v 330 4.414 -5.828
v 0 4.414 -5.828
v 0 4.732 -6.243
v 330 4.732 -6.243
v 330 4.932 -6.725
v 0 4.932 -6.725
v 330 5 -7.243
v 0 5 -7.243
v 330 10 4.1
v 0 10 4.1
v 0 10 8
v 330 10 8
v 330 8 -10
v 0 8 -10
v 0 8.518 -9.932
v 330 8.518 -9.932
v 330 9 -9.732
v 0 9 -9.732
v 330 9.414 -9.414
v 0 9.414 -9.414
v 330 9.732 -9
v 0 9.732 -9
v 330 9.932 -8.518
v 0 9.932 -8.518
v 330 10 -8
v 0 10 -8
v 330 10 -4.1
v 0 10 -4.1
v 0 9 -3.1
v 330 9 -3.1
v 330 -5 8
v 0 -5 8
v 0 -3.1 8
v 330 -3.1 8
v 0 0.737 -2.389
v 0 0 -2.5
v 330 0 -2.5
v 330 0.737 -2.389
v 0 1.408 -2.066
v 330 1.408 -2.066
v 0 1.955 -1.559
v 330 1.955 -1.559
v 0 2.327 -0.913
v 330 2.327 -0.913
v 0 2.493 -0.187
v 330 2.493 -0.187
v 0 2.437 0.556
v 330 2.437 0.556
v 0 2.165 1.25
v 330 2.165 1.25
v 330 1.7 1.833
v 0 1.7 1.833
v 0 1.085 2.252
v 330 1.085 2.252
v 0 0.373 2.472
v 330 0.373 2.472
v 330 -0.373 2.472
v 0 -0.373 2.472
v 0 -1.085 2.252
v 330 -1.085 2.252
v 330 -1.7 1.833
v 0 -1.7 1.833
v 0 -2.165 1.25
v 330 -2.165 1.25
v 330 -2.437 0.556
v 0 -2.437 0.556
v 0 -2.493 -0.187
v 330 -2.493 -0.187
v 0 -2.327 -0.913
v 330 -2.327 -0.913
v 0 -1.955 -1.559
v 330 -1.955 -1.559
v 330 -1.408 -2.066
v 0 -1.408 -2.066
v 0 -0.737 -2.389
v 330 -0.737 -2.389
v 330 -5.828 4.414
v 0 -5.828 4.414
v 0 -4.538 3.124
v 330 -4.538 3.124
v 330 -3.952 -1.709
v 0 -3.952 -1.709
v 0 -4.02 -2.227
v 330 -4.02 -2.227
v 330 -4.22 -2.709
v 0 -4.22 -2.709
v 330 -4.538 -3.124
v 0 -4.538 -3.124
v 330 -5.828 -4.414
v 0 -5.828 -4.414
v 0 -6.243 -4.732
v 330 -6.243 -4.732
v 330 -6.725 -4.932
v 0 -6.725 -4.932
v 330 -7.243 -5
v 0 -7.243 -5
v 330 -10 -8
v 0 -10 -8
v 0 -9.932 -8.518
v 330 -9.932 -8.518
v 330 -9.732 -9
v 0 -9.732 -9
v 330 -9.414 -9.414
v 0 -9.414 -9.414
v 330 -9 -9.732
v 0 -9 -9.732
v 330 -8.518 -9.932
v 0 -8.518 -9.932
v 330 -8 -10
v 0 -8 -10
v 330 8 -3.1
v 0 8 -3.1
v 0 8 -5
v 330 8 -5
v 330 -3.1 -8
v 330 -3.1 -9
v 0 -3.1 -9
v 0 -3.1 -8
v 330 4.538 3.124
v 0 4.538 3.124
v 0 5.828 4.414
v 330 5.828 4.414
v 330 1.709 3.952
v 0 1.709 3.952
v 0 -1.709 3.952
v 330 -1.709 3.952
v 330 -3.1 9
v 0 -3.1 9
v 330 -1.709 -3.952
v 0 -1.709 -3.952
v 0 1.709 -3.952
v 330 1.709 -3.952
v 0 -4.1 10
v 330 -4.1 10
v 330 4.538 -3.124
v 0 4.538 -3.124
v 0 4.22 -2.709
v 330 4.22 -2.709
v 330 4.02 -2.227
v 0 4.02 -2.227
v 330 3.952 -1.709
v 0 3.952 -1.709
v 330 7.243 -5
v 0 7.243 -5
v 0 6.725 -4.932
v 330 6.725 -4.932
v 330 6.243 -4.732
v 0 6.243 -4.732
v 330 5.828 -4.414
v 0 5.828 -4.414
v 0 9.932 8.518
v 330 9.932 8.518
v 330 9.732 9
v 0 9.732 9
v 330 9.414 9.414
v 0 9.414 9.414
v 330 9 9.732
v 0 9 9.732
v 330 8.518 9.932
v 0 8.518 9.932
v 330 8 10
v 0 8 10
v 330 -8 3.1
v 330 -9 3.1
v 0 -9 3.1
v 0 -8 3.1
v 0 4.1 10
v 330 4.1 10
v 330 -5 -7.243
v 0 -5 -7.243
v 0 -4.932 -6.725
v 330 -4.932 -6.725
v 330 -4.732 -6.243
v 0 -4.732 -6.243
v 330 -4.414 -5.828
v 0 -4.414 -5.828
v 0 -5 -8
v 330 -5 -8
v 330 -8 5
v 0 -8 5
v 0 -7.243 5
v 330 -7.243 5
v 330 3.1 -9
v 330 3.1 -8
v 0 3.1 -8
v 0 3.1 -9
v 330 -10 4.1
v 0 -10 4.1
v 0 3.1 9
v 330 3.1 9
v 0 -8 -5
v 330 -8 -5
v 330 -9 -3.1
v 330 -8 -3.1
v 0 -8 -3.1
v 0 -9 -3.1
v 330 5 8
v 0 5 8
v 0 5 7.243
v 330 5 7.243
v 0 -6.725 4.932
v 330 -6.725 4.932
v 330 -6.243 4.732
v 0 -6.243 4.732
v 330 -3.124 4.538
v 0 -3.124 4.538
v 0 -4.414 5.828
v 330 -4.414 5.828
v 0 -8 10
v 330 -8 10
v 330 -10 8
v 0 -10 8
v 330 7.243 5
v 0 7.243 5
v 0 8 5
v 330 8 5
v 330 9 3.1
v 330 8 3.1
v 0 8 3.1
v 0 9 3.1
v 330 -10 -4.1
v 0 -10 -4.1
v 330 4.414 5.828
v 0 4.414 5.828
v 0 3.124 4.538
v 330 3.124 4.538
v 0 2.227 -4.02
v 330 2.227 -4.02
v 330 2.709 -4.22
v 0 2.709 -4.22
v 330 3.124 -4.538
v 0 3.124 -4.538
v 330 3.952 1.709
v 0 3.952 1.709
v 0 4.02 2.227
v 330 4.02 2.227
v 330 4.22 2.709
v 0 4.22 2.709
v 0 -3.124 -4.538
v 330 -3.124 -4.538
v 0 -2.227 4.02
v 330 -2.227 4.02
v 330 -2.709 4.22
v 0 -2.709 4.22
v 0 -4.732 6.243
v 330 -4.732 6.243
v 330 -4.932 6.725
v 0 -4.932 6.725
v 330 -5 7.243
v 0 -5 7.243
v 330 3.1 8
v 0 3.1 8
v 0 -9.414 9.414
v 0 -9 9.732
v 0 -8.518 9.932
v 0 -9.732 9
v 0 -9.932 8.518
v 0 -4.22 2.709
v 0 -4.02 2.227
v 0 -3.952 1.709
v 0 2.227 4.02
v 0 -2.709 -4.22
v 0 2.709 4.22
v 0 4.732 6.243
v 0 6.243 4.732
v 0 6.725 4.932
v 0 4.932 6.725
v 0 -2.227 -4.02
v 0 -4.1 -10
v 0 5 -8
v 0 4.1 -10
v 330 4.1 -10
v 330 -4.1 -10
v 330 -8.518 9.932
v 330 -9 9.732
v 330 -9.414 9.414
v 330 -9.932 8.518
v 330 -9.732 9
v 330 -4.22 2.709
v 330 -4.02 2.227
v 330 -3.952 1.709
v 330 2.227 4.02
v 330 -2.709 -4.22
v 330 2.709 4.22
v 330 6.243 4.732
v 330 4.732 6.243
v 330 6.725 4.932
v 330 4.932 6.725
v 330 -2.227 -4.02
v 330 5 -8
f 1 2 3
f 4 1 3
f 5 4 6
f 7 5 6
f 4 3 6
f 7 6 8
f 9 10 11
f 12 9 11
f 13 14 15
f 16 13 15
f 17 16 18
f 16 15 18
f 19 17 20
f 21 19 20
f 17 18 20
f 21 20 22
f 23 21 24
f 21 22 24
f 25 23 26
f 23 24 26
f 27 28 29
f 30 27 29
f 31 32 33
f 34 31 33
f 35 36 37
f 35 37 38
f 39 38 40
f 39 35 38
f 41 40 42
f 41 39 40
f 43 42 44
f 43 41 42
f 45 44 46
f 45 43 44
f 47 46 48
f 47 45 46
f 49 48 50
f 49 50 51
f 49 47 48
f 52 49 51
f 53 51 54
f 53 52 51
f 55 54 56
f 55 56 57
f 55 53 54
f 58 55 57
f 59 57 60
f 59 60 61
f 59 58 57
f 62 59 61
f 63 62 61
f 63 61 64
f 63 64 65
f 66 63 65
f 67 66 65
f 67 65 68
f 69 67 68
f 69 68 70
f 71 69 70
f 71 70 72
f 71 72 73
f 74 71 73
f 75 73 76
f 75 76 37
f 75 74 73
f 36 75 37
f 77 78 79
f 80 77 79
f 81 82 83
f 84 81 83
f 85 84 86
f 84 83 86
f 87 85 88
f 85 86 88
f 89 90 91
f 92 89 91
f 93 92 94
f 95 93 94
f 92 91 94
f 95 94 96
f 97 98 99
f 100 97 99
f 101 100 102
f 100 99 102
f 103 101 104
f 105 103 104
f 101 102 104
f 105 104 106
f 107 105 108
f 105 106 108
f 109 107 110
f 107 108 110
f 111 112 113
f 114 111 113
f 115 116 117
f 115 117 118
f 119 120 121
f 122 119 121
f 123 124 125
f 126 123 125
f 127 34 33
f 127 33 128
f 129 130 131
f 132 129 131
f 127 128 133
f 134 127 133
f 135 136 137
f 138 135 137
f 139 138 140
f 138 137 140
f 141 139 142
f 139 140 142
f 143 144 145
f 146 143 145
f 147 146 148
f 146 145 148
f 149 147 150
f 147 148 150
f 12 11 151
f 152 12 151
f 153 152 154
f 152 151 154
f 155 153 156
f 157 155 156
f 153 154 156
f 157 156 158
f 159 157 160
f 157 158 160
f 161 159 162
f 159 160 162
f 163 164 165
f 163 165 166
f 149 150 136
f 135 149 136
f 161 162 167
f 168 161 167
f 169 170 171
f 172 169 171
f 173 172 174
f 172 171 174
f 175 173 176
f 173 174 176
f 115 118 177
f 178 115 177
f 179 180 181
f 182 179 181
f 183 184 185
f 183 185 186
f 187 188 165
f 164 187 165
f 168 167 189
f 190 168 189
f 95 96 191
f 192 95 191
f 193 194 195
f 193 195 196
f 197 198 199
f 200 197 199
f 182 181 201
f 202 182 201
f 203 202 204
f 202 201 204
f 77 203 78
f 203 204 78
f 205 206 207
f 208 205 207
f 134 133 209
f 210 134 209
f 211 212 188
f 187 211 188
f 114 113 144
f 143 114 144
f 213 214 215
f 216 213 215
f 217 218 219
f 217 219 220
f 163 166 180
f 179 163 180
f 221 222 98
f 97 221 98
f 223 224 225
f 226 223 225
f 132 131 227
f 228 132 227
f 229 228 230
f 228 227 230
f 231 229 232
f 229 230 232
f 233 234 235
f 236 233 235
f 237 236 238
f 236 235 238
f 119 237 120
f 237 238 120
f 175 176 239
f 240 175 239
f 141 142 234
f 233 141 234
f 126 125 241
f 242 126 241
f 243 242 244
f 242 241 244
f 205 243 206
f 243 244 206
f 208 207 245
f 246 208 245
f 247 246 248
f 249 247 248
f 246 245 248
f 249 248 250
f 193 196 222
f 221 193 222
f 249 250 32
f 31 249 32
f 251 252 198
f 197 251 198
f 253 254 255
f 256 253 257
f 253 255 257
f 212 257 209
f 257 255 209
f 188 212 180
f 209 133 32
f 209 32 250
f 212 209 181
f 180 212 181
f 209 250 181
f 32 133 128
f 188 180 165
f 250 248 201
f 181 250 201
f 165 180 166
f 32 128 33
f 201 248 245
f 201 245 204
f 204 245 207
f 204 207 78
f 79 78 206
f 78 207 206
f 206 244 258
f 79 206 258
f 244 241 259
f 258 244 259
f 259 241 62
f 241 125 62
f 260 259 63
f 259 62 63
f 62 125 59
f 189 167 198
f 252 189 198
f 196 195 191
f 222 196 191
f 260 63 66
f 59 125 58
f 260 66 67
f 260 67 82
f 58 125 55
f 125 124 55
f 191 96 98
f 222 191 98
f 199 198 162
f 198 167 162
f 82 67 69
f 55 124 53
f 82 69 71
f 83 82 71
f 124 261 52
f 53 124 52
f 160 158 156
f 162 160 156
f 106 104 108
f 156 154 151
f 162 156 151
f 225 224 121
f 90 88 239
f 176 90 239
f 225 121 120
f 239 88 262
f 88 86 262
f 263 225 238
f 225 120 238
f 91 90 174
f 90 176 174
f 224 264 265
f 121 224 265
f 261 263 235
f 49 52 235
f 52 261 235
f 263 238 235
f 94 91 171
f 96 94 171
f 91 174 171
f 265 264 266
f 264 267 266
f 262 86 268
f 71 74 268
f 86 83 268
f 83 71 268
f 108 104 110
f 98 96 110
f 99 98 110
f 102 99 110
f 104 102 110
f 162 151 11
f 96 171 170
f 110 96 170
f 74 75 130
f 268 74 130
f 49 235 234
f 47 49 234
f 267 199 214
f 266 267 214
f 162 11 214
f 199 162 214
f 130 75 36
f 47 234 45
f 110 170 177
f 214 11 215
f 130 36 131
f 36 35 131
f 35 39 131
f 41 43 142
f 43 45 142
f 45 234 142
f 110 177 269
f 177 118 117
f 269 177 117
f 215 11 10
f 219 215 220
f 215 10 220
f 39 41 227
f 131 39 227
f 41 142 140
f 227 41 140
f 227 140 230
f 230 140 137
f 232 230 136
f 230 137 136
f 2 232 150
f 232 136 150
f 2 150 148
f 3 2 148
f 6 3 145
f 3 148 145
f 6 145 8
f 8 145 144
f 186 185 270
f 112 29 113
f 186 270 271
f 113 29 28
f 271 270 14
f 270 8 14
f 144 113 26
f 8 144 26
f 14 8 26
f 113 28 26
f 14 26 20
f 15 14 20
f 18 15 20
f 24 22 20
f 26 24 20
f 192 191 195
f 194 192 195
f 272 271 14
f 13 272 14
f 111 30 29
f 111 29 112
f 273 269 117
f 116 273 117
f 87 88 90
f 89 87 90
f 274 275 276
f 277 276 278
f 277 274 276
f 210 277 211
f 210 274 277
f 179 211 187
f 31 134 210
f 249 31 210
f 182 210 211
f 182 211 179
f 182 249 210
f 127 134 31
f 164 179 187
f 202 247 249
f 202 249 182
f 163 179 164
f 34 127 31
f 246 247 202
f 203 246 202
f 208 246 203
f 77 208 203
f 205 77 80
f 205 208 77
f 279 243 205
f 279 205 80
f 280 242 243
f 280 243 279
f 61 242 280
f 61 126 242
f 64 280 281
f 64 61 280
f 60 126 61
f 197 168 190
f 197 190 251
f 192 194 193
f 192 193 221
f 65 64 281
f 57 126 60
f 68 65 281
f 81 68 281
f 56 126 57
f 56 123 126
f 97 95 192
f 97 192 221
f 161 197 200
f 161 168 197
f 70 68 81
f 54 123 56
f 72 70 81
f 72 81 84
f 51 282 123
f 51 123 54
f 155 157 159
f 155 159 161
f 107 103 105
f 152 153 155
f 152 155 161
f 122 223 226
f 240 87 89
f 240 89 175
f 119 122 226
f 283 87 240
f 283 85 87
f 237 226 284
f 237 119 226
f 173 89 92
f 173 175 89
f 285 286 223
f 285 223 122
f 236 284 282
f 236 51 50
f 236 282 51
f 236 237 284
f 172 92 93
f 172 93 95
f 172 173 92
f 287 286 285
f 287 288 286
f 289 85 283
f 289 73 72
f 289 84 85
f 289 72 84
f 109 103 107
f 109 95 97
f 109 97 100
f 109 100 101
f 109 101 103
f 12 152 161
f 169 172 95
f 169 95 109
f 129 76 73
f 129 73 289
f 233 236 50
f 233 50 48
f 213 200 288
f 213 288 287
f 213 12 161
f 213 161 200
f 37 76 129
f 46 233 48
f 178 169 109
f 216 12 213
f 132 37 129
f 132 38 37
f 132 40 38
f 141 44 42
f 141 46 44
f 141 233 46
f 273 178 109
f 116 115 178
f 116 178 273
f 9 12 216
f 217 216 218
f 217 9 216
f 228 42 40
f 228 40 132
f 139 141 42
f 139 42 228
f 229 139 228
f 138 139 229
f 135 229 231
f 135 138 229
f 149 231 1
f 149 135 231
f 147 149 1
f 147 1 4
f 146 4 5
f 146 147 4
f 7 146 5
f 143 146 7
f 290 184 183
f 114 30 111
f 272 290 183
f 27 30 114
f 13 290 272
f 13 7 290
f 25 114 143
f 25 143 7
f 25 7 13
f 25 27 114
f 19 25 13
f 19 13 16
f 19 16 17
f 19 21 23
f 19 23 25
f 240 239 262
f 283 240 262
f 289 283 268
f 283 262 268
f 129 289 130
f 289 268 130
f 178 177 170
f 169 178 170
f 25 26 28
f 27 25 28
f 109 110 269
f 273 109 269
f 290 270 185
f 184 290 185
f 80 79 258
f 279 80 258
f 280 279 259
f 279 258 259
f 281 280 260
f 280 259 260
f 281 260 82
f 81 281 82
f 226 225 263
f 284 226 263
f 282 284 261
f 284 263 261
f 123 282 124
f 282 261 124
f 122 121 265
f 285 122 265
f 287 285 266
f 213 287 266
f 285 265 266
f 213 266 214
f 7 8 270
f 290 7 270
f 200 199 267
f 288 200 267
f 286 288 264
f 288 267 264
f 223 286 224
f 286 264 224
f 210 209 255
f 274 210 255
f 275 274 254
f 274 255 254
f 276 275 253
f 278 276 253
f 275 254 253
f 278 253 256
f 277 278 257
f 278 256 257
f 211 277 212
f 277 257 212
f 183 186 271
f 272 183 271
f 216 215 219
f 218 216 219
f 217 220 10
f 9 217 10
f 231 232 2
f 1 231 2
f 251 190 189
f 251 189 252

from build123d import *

# Parameters (mm, degrees)
SKETCH1_R           = 2.5
BOSS_EXTRUDE1_DEPTH = 330


with BuildPart() as part:
    # Sketch1 → Boss-Extrude1 (new body)
    with BuildSketch(Plane(origin=(0, 0, 0), x_dir=(0, 0, -1), z_dir=(1, 0, 0))):
        with BuildLine():
            Line((-4.1, 10), (-8, 10))
            ThreePointArc((-8, 10), (-9.414213562, 9.414213562), (-10, 8))
            Line((-10, 8), (-10, 4.1))
            Line((-10, 4.1), (-9, 3.1))
            Line((-9, 3.1), (-8, 3.1))
            Line((-8, 3.1), (-8, 5))
            Line((-8, 5), (-7.242640687, 5))
            ThreePointArc((-7.242640687, 5), (-6.477273822, 4.847759065), (-5.828427125, 4.414213562))
            Line((-5.828427125, 4.414213562), (-4.537854624, 3.123641061))
            ThreePointArc((-4.537854624, 3.123641061), (-4.104309121, 2.474794364), (-3.952068186, 1.709427499))
            Line((-3.952068186, 1.709427499), (-3.952068186, -1.709427499))
            ThreePointArc((-3.952068186, -1.709427499), (-4.104309121, -2.474794364), (-4.537854624, -3.123641061))
            Line((-4.537854624, -3.123641061), (-5.828427125, -4.414213562))
            ThreePointArc((-5.828427125, -4.414213562), (-6.477273822, -4.847759065), (-7.242640687, -5))
            Line((-7.242640687, -5), (-8, -5))
            Line((-8, -5), (-8, -3.1))
            Line((-8, -3.1), (-9, -3.1))
            Line((-9, -3.1), (-10, -4.1))
            Line((-10, -4.1), (-10, -8))
            ThreePointArc((-10, -8), (-9.414213562, -9.414213562), (-8, -10))
            Line((-8, -10), (-4.1, -10))
            Line((-4.1, -10), (-3.1, -9))
            Line((-3.1, -9), (-3.1, -8))
            Line((-3.1, -8), (-5, -8))
            Line((-5, -8), (-5, -7.242640687))
            ThreePointArc((-5, -7.242640687), (-4.847759065, -6.477273822), (-4.414213562, -5.828427125))
            Line((-4.414213562, -5.828427125), (-3.123641061, -4.537854624))
            ThreePointArc((-3.123641061, -4.537854624), (-2.474794364, -4.104309121), (-1.709427499, -3.952068186))
            Line((-1.709427499, -3.952068186), (1.709427499, -3.952068186))
            ThreePointArc((1.709427499, -3.952068186), (2.474794364, -4.104309121), (3.123641061, -4.537854624))
            Line((3.123641061, -4.537854624), (4.414213562, -5.828427125))
            ThreePointArc((4.414213562, -5.828427125), (4.847759065, -6.477273822), (5, -7.242640687))
            Line((5, -7.242640687), (5, -8))
            Line((5, -8), (3.1, -8))
            Line((3.1, -8), (3.1, -9))
            Line((3.1, -9), (4.1, -10))
            Line((4.1, -10), (8, -10))
            ThreePointArc((8, -10), (9.414213562, -9.414213562), (10, -8))
            Line((10, -8), (10, -4.1))
            Line((10, -4.1), (9, -3.1))
            Line((9, -3.1), (8, -3.1))
            Line((8, -3.1), (8, -5))
            Line((8, -5), (7.242640687, -5))
            ThreePointArc((7.242640687, -5), (6.477273822, -4.847759065), (5.828427125, -4.414213562))
            Line((5.828427125, -4.414213562), (4.537854624, -3.123641061))
            ThreePointArc((4.537854624, -3.123641061), (4.104309121, -2.474794364), (3.952068186, -1.709427499))
            Line((3.952068186, -1.709427499), (3.952068186, 1.709427499))
            ThreePointArc((3.952068186, 1.709427499), (4.104309121, 2.474794364), (4.537854624, 3.123641061))
            Line((4.537854624, 3.123641061), (5.828427125, 4.414213562))
            ThreePointArc((5.828427125, 4.414213562), (6.477273822, 4.847759065), (7.242640687, 5))
            Line((7.242640687, 5), (8, 5))
            Line((8, 5), (8, 3.1))
            Line((8, 3.1), (9, 3.1))
            Line((9, 3.1), (10, 4.1))
            Line((10, 4.1), (10, 8))
            ThreePointArc((10, 8), (9.414213562, 9.414213562), (8, 10))
            Line((8, 10), (4.1, 10))
            Line((4.1, 10), (3.1, 9))
            Line((3.1, 9), (3.1, 8))
            Line((3.1, 8), (5, 8))
            Line((5, 8), (5, 7.242640687))
            ThreePointArc((5, 7.242640687), (4.847759065, 6.477273822), (4.414213562, 5.828427125))
            Line((4.414213562, 5.828427125), (3.123641061, 4.537854624))
            ThreePointArc((3.123641061, 4.537854624), (2.474794364, 4.104309121), (1.709427499, 3.952068186))
            Line((1.709427499, 3.952068186), (-1.709427499, 3.952068186))
            ThreePointArc((-1.709427499, 3.952068186), (-2.474794364, 4.104309121), (-3.123641061, 4.537854624))
            Line((-3.123641061, 4.537854624), (-4.414213562, 5.828427125))
            ThreePointArc((-4.414213562, 5.828427125), (-4.847759065, 6.477273822), (-5, 7.242640687))
            Line((-5, 7.242640687), (-5, 8))
            Line((-5, 8), (-3.1, 8))
            Line((-3.1, 8), (-3.1, 9))
            Line((-3.1, 9), (-4.1, 10))
        make_face()
        Circle(SKETCH1_R, mode=Mode.SUBTRACT)
    extrude(amount=BOSS_EXTRUDE1_DEPTH)


solid = part.part
